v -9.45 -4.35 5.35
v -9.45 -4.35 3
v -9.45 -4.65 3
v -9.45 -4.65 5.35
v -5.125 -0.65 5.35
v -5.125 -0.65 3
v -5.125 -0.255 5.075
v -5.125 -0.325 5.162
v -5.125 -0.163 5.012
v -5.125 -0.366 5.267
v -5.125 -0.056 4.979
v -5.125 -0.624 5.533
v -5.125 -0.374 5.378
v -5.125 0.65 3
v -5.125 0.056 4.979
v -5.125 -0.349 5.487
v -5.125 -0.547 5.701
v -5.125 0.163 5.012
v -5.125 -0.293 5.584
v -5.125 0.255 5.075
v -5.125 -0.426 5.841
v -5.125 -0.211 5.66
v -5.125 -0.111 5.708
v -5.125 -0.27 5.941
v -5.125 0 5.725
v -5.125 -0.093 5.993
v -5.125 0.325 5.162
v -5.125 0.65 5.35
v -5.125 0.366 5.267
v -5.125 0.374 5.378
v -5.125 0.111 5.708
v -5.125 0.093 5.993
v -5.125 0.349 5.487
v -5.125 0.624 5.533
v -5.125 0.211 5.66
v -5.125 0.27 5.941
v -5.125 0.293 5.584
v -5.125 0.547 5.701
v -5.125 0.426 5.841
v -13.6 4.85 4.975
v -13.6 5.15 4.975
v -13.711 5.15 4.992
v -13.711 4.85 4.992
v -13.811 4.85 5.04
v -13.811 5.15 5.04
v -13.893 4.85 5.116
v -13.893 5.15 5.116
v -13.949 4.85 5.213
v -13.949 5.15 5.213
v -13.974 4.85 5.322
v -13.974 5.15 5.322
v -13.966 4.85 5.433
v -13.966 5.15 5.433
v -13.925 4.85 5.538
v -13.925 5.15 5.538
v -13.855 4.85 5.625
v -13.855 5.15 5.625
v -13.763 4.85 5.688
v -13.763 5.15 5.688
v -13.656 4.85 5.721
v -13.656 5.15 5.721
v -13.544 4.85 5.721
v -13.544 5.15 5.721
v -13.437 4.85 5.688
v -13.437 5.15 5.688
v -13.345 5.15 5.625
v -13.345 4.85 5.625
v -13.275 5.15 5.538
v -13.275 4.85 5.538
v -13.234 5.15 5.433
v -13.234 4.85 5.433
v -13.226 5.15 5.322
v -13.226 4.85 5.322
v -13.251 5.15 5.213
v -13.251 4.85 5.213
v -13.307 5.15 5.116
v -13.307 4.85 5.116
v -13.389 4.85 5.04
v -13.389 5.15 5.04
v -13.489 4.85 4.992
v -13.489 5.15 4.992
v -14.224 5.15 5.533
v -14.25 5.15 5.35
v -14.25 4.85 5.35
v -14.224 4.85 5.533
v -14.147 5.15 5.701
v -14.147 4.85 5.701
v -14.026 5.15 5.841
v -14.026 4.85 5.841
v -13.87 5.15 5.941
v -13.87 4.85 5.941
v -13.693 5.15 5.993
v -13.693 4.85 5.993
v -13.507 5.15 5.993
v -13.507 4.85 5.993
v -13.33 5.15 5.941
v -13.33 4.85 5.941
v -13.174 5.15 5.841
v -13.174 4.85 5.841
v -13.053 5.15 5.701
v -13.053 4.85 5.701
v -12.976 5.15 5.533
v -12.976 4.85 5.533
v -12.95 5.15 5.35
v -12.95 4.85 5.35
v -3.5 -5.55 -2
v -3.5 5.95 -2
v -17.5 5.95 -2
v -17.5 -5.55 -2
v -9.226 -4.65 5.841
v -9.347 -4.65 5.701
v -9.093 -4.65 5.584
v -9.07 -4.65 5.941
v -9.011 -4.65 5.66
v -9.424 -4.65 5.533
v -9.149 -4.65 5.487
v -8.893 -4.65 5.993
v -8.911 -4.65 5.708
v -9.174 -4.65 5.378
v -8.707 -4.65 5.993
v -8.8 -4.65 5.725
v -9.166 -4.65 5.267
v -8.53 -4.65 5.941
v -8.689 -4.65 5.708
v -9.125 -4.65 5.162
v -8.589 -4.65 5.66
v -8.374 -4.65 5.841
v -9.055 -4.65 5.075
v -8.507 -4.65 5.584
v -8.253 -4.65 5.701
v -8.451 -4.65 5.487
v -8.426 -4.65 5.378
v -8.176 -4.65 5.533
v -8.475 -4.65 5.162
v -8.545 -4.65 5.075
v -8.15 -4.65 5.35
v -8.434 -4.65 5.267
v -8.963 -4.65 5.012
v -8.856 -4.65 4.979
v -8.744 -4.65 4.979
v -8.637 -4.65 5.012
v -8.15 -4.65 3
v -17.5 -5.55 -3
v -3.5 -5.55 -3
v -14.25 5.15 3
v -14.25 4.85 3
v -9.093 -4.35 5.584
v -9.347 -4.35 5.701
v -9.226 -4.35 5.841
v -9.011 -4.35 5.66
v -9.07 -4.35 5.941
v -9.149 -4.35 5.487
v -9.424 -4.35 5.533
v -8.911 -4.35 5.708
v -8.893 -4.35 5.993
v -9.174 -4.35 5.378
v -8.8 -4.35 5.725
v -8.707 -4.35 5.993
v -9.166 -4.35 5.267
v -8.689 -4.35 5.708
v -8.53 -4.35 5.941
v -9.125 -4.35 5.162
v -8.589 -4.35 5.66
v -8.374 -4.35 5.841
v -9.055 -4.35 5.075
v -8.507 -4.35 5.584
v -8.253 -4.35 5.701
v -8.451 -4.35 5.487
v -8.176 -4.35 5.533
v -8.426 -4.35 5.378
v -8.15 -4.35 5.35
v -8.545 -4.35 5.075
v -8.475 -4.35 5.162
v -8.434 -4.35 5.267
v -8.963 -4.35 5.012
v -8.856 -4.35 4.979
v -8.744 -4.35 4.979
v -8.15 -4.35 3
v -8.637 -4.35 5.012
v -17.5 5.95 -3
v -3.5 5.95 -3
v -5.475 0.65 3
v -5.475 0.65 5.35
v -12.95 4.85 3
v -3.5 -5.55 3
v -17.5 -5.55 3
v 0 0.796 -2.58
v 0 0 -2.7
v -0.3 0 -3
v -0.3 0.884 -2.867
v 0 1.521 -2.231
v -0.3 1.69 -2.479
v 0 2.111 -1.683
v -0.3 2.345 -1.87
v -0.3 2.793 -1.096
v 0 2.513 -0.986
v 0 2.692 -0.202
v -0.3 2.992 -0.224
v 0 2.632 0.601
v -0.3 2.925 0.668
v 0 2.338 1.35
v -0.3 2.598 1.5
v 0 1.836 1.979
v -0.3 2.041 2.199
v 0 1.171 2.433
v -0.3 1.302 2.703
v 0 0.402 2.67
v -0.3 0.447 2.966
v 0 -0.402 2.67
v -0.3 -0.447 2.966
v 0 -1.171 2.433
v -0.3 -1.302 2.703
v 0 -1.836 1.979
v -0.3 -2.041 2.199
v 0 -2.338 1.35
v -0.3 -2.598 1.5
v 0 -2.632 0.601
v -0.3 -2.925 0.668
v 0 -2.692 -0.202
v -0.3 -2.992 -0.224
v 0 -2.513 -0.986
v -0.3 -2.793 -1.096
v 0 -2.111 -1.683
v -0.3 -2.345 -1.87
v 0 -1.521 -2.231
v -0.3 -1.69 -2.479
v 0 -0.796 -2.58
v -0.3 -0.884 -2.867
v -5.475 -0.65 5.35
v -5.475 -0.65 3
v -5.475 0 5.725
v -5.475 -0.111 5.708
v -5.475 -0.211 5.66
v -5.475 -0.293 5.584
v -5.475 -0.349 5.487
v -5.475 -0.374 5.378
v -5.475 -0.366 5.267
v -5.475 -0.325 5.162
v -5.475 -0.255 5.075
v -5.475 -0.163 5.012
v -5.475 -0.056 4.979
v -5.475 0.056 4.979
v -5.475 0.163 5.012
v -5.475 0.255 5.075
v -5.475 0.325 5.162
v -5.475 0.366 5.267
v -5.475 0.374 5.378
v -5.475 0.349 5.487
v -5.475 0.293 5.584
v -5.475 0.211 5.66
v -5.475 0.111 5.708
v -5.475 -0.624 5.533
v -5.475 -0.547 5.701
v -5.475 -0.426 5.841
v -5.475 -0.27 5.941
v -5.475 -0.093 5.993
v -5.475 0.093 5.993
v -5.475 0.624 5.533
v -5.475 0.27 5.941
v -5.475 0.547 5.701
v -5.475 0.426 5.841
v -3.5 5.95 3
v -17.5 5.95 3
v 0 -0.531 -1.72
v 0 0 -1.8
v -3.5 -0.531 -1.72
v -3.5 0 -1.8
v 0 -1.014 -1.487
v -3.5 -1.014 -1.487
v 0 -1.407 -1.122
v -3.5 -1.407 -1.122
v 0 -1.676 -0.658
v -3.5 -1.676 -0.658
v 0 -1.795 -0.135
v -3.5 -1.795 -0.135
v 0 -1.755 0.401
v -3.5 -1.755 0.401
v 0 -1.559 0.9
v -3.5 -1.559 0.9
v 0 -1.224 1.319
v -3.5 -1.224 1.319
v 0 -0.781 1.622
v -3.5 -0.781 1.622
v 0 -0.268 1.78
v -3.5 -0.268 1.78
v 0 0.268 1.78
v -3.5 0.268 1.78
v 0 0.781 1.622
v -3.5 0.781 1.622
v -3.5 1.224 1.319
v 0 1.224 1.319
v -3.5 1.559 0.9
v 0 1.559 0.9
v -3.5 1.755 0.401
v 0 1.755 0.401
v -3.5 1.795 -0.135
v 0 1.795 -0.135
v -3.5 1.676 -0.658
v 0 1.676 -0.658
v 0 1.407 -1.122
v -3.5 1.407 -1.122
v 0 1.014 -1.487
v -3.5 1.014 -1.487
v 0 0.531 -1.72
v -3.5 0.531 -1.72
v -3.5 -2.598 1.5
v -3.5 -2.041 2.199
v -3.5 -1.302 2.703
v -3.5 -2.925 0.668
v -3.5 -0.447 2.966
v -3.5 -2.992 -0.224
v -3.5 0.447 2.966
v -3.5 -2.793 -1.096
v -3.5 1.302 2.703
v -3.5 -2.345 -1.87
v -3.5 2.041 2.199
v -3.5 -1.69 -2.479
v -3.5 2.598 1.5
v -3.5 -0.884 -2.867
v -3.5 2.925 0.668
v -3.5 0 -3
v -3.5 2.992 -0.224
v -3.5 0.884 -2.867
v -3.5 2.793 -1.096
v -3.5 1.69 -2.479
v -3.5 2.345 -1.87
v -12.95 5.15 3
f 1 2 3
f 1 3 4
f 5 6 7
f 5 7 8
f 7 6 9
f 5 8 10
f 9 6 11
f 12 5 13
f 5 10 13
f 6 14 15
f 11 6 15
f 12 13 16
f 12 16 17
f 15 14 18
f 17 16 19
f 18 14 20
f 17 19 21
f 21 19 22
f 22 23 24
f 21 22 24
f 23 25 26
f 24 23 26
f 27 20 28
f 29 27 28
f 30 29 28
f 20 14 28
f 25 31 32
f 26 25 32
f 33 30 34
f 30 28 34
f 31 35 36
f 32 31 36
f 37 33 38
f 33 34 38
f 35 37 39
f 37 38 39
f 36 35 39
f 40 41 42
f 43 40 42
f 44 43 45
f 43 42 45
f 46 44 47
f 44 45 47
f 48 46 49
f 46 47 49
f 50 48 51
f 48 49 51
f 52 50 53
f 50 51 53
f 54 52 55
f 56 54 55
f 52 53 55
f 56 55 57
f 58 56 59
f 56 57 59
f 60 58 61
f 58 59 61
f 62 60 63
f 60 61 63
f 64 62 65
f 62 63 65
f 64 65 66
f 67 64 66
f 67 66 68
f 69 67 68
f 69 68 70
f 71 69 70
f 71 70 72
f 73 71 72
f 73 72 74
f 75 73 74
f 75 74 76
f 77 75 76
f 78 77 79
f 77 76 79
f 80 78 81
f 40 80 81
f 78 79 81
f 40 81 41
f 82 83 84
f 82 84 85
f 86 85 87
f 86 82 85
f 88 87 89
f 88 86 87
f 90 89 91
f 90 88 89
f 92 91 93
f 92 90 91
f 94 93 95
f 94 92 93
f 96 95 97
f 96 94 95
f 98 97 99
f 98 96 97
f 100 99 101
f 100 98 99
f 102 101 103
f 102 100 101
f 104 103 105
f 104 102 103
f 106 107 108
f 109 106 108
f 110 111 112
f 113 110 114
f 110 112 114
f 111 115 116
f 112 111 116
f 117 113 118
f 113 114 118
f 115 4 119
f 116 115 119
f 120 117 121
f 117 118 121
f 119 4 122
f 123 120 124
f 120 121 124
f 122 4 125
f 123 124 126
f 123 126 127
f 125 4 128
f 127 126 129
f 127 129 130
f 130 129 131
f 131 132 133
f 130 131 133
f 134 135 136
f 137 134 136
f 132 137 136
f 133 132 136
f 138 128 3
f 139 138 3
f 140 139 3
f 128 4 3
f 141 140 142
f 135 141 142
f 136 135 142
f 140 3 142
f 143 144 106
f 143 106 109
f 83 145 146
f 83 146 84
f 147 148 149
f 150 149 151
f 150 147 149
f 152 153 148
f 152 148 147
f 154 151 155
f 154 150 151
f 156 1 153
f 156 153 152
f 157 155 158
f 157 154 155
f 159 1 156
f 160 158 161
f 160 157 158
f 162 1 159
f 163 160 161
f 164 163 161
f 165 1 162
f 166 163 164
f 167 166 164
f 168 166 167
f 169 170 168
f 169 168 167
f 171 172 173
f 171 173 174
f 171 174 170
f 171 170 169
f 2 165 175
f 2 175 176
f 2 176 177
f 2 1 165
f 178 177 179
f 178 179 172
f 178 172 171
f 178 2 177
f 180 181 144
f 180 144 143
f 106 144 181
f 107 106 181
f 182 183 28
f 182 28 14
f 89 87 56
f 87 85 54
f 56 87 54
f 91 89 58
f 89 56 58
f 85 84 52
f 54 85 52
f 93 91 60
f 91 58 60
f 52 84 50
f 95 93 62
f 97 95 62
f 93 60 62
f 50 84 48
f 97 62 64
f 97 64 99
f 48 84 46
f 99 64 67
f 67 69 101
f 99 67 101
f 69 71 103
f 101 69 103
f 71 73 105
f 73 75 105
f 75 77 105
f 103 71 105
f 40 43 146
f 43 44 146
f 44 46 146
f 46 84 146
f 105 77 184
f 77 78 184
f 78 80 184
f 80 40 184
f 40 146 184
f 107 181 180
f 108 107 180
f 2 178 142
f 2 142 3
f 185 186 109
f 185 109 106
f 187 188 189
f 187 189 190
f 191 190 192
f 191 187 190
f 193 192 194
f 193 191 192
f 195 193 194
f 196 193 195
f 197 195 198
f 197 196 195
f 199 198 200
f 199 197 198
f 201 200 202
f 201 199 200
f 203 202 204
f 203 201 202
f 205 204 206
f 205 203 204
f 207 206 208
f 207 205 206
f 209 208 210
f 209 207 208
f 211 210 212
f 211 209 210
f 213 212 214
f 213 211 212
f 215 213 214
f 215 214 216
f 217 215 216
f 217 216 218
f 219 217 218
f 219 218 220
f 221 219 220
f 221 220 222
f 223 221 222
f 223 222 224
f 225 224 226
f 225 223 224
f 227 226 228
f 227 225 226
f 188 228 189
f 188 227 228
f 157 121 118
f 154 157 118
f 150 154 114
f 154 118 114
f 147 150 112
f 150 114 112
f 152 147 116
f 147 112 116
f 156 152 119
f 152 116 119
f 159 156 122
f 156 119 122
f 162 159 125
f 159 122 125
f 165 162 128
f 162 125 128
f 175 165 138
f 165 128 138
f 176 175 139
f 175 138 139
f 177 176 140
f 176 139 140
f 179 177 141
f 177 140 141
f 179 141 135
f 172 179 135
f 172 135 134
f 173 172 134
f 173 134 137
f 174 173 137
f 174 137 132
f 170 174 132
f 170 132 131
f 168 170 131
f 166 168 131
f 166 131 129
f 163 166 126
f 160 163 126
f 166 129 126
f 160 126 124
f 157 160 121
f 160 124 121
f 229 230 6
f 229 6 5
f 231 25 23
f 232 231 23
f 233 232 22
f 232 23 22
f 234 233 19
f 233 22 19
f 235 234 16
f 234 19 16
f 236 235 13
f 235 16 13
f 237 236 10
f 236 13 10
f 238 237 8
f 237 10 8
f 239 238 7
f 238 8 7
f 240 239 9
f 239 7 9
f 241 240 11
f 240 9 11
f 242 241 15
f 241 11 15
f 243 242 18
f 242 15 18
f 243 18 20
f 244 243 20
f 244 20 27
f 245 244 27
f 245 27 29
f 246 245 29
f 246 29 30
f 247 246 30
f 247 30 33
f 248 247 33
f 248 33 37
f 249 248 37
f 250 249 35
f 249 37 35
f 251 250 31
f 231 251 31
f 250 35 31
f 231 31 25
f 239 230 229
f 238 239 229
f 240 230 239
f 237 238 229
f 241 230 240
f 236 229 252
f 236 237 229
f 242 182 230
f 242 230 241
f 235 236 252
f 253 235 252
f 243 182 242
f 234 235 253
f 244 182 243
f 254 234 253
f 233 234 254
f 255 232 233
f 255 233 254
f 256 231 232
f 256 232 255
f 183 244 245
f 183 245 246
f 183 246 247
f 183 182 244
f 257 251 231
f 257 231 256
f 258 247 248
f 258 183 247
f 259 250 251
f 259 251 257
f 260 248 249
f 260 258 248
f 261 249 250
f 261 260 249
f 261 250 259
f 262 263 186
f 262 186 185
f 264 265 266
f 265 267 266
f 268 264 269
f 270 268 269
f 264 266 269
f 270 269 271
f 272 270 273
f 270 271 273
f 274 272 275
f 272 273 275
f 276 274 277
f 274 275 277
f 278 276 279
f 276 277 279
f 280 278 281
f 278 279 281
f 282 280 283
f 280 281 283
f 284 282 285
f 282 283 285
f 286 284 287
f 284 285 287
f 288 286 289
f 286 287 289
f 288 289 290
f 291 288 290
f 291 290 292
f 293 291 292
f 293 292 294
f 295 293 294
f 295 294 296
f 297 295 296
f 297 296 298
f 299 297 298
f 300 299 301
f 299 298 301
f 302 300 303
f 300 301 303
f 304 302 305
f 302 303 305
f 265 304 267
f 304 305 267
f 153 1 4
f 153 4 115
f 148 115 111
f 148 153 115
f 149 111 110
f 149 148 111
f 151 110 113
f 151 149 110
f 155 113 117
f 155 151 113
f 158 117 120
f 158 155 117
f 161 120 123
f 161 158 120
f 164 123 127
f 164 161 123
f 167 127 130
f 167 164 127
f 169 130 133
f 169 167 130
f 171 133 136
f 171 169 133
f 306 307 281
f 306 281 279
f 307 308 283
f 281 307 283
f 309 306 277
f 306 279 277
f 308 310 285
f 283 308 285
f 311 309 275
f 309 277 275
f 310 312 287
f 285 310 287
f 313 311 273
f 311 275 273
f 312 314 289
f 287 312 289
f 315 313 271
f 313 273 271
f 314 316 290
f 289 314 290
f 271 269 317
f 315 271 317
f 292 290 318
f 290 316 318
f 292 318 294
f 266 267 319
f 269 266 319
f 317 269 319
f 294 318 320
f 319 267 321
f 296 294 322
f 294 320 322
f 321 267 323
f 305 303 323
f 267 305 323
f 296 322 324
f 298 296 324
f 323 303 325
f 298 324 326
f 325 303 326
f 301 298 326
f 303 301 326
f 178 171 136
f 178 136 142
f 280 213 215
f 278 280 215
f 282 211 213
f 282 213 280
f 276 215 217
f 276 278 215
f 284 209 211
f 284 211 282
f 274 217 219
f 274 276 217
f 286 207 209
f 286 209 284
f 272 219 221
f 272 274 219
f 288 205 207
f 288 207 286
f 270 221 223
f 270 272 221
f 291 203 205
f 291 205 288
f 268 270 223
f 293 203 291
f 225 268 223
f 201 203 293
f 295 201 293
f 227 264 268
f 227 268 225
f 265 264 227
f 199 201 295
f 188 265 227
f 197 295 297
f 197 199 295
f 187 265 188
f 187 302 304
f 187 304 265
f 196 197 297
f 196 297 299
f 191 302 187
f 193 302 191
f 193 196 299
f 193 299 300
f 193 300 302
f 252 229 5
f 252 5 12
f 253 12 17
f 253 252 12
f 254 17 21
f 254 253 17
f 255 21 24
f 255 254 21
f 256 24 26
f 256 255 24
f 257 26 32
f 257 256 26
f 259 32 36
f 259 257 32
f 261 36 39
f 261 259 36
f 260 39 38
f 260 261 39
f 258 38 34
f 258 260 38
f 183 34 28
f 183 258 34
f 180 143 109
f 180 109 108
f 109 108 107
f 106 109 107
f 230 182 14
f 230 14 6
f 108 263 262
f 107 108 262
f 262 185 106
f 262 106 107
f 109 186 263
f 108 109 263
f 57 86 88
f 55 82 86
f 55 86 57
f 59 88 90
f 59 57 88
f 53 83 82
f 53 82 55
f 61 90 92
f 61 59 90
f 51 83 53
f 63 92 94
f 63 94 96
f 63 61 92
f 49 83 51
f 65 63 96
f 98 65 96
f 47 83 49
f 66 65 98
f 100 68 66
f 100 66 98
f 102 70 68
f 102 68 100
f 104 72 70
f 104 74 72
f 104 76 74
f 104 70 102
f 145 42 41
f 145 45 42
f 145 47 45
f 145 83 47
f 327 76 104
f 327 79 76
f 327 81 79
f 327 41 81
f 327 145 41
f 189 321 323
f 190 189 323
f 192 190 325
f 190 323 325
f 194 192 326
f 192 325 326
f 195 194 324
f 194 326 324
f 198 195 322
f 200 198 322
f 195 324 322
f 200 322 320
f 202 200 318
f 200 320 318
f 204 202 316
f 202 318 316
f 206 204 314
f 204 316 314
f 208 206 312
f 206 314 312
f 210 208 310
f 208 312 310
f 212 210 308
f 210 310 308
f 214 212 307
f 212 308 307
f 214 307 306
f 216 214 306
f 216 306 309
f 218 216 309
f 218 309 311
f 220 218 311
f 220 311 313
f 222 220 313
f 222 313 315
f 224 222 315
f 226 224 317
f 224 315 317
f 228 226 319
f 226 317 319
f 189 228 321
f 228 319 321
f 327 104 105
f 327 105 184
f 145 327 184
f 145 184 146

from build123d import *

# Parameters (mm, degrees)
SKETCH1_W           = 14
SKETCH1_H           = 11.5
BOSS_EXTRUDE1_DEPTH = 1
SKETCH6_W           = 14
SKETCH6_H           = 11.5
BOSS_EXTRUDE2_DEPTH = 5
SKETCH12_R          = 3
BOSS_EXTRUDE3_DEPTH = 3.5
BOSS_EXTRUDE4_DEPTH = 0.3
BOSS_EXTRUDE5_DEPTH = 0.35
BOSS_EXTRUDE6_DEPTH = 0.3
SKETCH37_W          = 0.375
SKETCH37_H          = 1.2
SKETCH39_W          = 0.375
SKETCH39_H          = 5.475
SKETCH41_W          = 0.375
SKETCH41_H          = 1.1
SKETCH43_W          = 1.8
SKETCH43_H          = 3.5
CHAMFER1_SIZE       = 0.3


with BuildPart() as part:
    # Sketch1 → Boss-Extrude1 (new body)
    with BuildSketch(Plane(origin=(0, 0, -3), x_dir=(-1, 0, 0), z_dir=(0, 0, -1))):
        with Locations((10.5, 0.2)):
            Rectangle(SKETCH1_W, SKETCH1_H)
    extrude(amount=-BOSS_EXTRUDE1_DEPTH)


with BuildPart() as body_2:
    # Sketch6 → Boss-Extrude2 (new body)
    with BuildSketch(Plane.XY.offset(3)):
        with Locations((-10.5, 0.2)):
            Rectangle(SKETCH6_W, SKETCH6_H)
    extrude(amount=-BOSS_EXTRUDE2_DEPTH)


with BuildPart() as body_3:
    # Sketch12 → Boss-Extrude3 (new body)
    with BuildSketch(Plane(origin=(-3.5, 0, 0), x_dir=(0, 0, -1), z_dir=(1, 0, 0))):
        Circle(SKETCH12_R)
    extrude(amount=BOSS_EXTRUDE3_DEPTH)

    # Sketch43 → Ø3.6 (3.6) Diameter Hole1 (revolve, cut)
    with BuildSketch(Plane(origin=(0, 0, 0), x_dir=(0, 0, -1), z_dir=(0, 1, 0))):
        with Locations((0.9, 1.75)):
            Rectangle(SKETCH43_W, SKETCH43_H)
    revolve(axis=Axis((6.35, 0, 0), (-1, 0, 0)), mode=Mode.SUBTRACT)

    # Chamfer1
    chamfer1_edges = [body_3.edges().sort_by_distance(p)[0] for p in [
        (0, 0, 3),
    ]]
    chamfer(chamfer1_edges, length=CHAMFER1_SIZE)


with BuildPart() as body_4:
    # Sketch19 → Boss-Extrude4 (new body)
    with BuildSketch(Plane(origin=(0, 5.15, 0), x_dir=(1, 0, 0), z_dir=(0, 1, 0))):
        with BuildLine():
            Line((-14.25, -3), (-14.25, -5.35))
            ThreePointArc((-14.25, -5.35), (-13.6, -6), (-12.95, -5.35))
            Line((-12.95, -5.35), (-12.95, -3))
            Line((-12.95, -3), (-14.25, -3))
        make_face()
    extrude(amount=-BOSS_EXTRUDE4_DEPTH)

    # Sketch41 → Ø0.75 (0.75) Diameter Hole3 (revolve, cut)
    with BuildSketch(Plane(origin=(-13.6, 4.85, 5.35), x_dir=(0, 0, -1), z_dir=(1, 0, 0))):
        with Locations((0.1875, 0.55)):
            Rectangle(SKETCH41_W, SKETCH41_H)
    revolve(axis=Axis((-13.6, -1.5, 5.35), (0, 1, 0)), mode=Mode.SUBTRACT)


with BuildPart() as body_5:
    # Sketch27 → Boss-Extrude5 (new body)
    with BuildSketch(Plane.ZY.offset(5.475)):
        with BuildLine():
            Line((3, -0.65), (5.35, -0.65))
            ThreePointArc((5.35, -0.65), (6, 0), (5.35, 0.65))
            Line((5.35, 0.65), (3, 0.65))
            Line((3, 0.65), (3, -0.65))
        make_face()
    extrude(amount=-BOSS_EXTRUDE5_DEPTH)

    # Sketch39 → Ø0.75 (0.75) Diameter Hole2 (revolve, cut)
    with BuildSketch(Plane(origin=(-5.475, 0, 5.35), x_dir=(0, 0, 1), z_dir=(0, 1, 0))):
        with Locations((0.1875, 2.7375)):
            Rectangle(SKETCH39_W, SKETCH39_H)
    revolve(axis=Axis((-11.825, 0, 5.35), (1, 0, 0)), mode=Mode.SUBTRACT)


with BuildPart() as body_6:
    # Sketch36 → Boss-Extrude6 (new body)
    with BuildSketch(Plane(origin=(0, -4.35, 0), x_dir=(1, 0, 0), z_dir=(0, 1, 0))):
        with BuildLine():
            Line((-9.45, -3), (-9.45, -5.35))
            ThreePointArc((-9.45, -5.35), (-8.8, -6), (-8.15, -5.35))
            Line((-8.15, -5.35), (-8.15, -3))
            Line((-8.15, -3), (-9.45, -3))
        make_face()
    extrude(amount=-BOSS_EXTRUDE6_DEPTH)

    # Sketch37 → Ø0.75 (0.75) Diameter Hole1 (revolve, cut)
    with BuildSketch(Plane(origin=(-8.8, -4.35, 5.35), x_dir=(0, 0, 1), z_dir=(1, 0, 0))):
        with Locations((0.1875, 0.6)):
            Rectangle(SKETCH37_W, SKETCH37_H)
    revolve(axis=Axis((-8.8, 2, 5.35), (0, -1, 0)), mode=Mode.SUBTRACT)


solid = Compound([part.part, body_2.part, body_3.part, body_4.part, body_5.part, body_6.part])
